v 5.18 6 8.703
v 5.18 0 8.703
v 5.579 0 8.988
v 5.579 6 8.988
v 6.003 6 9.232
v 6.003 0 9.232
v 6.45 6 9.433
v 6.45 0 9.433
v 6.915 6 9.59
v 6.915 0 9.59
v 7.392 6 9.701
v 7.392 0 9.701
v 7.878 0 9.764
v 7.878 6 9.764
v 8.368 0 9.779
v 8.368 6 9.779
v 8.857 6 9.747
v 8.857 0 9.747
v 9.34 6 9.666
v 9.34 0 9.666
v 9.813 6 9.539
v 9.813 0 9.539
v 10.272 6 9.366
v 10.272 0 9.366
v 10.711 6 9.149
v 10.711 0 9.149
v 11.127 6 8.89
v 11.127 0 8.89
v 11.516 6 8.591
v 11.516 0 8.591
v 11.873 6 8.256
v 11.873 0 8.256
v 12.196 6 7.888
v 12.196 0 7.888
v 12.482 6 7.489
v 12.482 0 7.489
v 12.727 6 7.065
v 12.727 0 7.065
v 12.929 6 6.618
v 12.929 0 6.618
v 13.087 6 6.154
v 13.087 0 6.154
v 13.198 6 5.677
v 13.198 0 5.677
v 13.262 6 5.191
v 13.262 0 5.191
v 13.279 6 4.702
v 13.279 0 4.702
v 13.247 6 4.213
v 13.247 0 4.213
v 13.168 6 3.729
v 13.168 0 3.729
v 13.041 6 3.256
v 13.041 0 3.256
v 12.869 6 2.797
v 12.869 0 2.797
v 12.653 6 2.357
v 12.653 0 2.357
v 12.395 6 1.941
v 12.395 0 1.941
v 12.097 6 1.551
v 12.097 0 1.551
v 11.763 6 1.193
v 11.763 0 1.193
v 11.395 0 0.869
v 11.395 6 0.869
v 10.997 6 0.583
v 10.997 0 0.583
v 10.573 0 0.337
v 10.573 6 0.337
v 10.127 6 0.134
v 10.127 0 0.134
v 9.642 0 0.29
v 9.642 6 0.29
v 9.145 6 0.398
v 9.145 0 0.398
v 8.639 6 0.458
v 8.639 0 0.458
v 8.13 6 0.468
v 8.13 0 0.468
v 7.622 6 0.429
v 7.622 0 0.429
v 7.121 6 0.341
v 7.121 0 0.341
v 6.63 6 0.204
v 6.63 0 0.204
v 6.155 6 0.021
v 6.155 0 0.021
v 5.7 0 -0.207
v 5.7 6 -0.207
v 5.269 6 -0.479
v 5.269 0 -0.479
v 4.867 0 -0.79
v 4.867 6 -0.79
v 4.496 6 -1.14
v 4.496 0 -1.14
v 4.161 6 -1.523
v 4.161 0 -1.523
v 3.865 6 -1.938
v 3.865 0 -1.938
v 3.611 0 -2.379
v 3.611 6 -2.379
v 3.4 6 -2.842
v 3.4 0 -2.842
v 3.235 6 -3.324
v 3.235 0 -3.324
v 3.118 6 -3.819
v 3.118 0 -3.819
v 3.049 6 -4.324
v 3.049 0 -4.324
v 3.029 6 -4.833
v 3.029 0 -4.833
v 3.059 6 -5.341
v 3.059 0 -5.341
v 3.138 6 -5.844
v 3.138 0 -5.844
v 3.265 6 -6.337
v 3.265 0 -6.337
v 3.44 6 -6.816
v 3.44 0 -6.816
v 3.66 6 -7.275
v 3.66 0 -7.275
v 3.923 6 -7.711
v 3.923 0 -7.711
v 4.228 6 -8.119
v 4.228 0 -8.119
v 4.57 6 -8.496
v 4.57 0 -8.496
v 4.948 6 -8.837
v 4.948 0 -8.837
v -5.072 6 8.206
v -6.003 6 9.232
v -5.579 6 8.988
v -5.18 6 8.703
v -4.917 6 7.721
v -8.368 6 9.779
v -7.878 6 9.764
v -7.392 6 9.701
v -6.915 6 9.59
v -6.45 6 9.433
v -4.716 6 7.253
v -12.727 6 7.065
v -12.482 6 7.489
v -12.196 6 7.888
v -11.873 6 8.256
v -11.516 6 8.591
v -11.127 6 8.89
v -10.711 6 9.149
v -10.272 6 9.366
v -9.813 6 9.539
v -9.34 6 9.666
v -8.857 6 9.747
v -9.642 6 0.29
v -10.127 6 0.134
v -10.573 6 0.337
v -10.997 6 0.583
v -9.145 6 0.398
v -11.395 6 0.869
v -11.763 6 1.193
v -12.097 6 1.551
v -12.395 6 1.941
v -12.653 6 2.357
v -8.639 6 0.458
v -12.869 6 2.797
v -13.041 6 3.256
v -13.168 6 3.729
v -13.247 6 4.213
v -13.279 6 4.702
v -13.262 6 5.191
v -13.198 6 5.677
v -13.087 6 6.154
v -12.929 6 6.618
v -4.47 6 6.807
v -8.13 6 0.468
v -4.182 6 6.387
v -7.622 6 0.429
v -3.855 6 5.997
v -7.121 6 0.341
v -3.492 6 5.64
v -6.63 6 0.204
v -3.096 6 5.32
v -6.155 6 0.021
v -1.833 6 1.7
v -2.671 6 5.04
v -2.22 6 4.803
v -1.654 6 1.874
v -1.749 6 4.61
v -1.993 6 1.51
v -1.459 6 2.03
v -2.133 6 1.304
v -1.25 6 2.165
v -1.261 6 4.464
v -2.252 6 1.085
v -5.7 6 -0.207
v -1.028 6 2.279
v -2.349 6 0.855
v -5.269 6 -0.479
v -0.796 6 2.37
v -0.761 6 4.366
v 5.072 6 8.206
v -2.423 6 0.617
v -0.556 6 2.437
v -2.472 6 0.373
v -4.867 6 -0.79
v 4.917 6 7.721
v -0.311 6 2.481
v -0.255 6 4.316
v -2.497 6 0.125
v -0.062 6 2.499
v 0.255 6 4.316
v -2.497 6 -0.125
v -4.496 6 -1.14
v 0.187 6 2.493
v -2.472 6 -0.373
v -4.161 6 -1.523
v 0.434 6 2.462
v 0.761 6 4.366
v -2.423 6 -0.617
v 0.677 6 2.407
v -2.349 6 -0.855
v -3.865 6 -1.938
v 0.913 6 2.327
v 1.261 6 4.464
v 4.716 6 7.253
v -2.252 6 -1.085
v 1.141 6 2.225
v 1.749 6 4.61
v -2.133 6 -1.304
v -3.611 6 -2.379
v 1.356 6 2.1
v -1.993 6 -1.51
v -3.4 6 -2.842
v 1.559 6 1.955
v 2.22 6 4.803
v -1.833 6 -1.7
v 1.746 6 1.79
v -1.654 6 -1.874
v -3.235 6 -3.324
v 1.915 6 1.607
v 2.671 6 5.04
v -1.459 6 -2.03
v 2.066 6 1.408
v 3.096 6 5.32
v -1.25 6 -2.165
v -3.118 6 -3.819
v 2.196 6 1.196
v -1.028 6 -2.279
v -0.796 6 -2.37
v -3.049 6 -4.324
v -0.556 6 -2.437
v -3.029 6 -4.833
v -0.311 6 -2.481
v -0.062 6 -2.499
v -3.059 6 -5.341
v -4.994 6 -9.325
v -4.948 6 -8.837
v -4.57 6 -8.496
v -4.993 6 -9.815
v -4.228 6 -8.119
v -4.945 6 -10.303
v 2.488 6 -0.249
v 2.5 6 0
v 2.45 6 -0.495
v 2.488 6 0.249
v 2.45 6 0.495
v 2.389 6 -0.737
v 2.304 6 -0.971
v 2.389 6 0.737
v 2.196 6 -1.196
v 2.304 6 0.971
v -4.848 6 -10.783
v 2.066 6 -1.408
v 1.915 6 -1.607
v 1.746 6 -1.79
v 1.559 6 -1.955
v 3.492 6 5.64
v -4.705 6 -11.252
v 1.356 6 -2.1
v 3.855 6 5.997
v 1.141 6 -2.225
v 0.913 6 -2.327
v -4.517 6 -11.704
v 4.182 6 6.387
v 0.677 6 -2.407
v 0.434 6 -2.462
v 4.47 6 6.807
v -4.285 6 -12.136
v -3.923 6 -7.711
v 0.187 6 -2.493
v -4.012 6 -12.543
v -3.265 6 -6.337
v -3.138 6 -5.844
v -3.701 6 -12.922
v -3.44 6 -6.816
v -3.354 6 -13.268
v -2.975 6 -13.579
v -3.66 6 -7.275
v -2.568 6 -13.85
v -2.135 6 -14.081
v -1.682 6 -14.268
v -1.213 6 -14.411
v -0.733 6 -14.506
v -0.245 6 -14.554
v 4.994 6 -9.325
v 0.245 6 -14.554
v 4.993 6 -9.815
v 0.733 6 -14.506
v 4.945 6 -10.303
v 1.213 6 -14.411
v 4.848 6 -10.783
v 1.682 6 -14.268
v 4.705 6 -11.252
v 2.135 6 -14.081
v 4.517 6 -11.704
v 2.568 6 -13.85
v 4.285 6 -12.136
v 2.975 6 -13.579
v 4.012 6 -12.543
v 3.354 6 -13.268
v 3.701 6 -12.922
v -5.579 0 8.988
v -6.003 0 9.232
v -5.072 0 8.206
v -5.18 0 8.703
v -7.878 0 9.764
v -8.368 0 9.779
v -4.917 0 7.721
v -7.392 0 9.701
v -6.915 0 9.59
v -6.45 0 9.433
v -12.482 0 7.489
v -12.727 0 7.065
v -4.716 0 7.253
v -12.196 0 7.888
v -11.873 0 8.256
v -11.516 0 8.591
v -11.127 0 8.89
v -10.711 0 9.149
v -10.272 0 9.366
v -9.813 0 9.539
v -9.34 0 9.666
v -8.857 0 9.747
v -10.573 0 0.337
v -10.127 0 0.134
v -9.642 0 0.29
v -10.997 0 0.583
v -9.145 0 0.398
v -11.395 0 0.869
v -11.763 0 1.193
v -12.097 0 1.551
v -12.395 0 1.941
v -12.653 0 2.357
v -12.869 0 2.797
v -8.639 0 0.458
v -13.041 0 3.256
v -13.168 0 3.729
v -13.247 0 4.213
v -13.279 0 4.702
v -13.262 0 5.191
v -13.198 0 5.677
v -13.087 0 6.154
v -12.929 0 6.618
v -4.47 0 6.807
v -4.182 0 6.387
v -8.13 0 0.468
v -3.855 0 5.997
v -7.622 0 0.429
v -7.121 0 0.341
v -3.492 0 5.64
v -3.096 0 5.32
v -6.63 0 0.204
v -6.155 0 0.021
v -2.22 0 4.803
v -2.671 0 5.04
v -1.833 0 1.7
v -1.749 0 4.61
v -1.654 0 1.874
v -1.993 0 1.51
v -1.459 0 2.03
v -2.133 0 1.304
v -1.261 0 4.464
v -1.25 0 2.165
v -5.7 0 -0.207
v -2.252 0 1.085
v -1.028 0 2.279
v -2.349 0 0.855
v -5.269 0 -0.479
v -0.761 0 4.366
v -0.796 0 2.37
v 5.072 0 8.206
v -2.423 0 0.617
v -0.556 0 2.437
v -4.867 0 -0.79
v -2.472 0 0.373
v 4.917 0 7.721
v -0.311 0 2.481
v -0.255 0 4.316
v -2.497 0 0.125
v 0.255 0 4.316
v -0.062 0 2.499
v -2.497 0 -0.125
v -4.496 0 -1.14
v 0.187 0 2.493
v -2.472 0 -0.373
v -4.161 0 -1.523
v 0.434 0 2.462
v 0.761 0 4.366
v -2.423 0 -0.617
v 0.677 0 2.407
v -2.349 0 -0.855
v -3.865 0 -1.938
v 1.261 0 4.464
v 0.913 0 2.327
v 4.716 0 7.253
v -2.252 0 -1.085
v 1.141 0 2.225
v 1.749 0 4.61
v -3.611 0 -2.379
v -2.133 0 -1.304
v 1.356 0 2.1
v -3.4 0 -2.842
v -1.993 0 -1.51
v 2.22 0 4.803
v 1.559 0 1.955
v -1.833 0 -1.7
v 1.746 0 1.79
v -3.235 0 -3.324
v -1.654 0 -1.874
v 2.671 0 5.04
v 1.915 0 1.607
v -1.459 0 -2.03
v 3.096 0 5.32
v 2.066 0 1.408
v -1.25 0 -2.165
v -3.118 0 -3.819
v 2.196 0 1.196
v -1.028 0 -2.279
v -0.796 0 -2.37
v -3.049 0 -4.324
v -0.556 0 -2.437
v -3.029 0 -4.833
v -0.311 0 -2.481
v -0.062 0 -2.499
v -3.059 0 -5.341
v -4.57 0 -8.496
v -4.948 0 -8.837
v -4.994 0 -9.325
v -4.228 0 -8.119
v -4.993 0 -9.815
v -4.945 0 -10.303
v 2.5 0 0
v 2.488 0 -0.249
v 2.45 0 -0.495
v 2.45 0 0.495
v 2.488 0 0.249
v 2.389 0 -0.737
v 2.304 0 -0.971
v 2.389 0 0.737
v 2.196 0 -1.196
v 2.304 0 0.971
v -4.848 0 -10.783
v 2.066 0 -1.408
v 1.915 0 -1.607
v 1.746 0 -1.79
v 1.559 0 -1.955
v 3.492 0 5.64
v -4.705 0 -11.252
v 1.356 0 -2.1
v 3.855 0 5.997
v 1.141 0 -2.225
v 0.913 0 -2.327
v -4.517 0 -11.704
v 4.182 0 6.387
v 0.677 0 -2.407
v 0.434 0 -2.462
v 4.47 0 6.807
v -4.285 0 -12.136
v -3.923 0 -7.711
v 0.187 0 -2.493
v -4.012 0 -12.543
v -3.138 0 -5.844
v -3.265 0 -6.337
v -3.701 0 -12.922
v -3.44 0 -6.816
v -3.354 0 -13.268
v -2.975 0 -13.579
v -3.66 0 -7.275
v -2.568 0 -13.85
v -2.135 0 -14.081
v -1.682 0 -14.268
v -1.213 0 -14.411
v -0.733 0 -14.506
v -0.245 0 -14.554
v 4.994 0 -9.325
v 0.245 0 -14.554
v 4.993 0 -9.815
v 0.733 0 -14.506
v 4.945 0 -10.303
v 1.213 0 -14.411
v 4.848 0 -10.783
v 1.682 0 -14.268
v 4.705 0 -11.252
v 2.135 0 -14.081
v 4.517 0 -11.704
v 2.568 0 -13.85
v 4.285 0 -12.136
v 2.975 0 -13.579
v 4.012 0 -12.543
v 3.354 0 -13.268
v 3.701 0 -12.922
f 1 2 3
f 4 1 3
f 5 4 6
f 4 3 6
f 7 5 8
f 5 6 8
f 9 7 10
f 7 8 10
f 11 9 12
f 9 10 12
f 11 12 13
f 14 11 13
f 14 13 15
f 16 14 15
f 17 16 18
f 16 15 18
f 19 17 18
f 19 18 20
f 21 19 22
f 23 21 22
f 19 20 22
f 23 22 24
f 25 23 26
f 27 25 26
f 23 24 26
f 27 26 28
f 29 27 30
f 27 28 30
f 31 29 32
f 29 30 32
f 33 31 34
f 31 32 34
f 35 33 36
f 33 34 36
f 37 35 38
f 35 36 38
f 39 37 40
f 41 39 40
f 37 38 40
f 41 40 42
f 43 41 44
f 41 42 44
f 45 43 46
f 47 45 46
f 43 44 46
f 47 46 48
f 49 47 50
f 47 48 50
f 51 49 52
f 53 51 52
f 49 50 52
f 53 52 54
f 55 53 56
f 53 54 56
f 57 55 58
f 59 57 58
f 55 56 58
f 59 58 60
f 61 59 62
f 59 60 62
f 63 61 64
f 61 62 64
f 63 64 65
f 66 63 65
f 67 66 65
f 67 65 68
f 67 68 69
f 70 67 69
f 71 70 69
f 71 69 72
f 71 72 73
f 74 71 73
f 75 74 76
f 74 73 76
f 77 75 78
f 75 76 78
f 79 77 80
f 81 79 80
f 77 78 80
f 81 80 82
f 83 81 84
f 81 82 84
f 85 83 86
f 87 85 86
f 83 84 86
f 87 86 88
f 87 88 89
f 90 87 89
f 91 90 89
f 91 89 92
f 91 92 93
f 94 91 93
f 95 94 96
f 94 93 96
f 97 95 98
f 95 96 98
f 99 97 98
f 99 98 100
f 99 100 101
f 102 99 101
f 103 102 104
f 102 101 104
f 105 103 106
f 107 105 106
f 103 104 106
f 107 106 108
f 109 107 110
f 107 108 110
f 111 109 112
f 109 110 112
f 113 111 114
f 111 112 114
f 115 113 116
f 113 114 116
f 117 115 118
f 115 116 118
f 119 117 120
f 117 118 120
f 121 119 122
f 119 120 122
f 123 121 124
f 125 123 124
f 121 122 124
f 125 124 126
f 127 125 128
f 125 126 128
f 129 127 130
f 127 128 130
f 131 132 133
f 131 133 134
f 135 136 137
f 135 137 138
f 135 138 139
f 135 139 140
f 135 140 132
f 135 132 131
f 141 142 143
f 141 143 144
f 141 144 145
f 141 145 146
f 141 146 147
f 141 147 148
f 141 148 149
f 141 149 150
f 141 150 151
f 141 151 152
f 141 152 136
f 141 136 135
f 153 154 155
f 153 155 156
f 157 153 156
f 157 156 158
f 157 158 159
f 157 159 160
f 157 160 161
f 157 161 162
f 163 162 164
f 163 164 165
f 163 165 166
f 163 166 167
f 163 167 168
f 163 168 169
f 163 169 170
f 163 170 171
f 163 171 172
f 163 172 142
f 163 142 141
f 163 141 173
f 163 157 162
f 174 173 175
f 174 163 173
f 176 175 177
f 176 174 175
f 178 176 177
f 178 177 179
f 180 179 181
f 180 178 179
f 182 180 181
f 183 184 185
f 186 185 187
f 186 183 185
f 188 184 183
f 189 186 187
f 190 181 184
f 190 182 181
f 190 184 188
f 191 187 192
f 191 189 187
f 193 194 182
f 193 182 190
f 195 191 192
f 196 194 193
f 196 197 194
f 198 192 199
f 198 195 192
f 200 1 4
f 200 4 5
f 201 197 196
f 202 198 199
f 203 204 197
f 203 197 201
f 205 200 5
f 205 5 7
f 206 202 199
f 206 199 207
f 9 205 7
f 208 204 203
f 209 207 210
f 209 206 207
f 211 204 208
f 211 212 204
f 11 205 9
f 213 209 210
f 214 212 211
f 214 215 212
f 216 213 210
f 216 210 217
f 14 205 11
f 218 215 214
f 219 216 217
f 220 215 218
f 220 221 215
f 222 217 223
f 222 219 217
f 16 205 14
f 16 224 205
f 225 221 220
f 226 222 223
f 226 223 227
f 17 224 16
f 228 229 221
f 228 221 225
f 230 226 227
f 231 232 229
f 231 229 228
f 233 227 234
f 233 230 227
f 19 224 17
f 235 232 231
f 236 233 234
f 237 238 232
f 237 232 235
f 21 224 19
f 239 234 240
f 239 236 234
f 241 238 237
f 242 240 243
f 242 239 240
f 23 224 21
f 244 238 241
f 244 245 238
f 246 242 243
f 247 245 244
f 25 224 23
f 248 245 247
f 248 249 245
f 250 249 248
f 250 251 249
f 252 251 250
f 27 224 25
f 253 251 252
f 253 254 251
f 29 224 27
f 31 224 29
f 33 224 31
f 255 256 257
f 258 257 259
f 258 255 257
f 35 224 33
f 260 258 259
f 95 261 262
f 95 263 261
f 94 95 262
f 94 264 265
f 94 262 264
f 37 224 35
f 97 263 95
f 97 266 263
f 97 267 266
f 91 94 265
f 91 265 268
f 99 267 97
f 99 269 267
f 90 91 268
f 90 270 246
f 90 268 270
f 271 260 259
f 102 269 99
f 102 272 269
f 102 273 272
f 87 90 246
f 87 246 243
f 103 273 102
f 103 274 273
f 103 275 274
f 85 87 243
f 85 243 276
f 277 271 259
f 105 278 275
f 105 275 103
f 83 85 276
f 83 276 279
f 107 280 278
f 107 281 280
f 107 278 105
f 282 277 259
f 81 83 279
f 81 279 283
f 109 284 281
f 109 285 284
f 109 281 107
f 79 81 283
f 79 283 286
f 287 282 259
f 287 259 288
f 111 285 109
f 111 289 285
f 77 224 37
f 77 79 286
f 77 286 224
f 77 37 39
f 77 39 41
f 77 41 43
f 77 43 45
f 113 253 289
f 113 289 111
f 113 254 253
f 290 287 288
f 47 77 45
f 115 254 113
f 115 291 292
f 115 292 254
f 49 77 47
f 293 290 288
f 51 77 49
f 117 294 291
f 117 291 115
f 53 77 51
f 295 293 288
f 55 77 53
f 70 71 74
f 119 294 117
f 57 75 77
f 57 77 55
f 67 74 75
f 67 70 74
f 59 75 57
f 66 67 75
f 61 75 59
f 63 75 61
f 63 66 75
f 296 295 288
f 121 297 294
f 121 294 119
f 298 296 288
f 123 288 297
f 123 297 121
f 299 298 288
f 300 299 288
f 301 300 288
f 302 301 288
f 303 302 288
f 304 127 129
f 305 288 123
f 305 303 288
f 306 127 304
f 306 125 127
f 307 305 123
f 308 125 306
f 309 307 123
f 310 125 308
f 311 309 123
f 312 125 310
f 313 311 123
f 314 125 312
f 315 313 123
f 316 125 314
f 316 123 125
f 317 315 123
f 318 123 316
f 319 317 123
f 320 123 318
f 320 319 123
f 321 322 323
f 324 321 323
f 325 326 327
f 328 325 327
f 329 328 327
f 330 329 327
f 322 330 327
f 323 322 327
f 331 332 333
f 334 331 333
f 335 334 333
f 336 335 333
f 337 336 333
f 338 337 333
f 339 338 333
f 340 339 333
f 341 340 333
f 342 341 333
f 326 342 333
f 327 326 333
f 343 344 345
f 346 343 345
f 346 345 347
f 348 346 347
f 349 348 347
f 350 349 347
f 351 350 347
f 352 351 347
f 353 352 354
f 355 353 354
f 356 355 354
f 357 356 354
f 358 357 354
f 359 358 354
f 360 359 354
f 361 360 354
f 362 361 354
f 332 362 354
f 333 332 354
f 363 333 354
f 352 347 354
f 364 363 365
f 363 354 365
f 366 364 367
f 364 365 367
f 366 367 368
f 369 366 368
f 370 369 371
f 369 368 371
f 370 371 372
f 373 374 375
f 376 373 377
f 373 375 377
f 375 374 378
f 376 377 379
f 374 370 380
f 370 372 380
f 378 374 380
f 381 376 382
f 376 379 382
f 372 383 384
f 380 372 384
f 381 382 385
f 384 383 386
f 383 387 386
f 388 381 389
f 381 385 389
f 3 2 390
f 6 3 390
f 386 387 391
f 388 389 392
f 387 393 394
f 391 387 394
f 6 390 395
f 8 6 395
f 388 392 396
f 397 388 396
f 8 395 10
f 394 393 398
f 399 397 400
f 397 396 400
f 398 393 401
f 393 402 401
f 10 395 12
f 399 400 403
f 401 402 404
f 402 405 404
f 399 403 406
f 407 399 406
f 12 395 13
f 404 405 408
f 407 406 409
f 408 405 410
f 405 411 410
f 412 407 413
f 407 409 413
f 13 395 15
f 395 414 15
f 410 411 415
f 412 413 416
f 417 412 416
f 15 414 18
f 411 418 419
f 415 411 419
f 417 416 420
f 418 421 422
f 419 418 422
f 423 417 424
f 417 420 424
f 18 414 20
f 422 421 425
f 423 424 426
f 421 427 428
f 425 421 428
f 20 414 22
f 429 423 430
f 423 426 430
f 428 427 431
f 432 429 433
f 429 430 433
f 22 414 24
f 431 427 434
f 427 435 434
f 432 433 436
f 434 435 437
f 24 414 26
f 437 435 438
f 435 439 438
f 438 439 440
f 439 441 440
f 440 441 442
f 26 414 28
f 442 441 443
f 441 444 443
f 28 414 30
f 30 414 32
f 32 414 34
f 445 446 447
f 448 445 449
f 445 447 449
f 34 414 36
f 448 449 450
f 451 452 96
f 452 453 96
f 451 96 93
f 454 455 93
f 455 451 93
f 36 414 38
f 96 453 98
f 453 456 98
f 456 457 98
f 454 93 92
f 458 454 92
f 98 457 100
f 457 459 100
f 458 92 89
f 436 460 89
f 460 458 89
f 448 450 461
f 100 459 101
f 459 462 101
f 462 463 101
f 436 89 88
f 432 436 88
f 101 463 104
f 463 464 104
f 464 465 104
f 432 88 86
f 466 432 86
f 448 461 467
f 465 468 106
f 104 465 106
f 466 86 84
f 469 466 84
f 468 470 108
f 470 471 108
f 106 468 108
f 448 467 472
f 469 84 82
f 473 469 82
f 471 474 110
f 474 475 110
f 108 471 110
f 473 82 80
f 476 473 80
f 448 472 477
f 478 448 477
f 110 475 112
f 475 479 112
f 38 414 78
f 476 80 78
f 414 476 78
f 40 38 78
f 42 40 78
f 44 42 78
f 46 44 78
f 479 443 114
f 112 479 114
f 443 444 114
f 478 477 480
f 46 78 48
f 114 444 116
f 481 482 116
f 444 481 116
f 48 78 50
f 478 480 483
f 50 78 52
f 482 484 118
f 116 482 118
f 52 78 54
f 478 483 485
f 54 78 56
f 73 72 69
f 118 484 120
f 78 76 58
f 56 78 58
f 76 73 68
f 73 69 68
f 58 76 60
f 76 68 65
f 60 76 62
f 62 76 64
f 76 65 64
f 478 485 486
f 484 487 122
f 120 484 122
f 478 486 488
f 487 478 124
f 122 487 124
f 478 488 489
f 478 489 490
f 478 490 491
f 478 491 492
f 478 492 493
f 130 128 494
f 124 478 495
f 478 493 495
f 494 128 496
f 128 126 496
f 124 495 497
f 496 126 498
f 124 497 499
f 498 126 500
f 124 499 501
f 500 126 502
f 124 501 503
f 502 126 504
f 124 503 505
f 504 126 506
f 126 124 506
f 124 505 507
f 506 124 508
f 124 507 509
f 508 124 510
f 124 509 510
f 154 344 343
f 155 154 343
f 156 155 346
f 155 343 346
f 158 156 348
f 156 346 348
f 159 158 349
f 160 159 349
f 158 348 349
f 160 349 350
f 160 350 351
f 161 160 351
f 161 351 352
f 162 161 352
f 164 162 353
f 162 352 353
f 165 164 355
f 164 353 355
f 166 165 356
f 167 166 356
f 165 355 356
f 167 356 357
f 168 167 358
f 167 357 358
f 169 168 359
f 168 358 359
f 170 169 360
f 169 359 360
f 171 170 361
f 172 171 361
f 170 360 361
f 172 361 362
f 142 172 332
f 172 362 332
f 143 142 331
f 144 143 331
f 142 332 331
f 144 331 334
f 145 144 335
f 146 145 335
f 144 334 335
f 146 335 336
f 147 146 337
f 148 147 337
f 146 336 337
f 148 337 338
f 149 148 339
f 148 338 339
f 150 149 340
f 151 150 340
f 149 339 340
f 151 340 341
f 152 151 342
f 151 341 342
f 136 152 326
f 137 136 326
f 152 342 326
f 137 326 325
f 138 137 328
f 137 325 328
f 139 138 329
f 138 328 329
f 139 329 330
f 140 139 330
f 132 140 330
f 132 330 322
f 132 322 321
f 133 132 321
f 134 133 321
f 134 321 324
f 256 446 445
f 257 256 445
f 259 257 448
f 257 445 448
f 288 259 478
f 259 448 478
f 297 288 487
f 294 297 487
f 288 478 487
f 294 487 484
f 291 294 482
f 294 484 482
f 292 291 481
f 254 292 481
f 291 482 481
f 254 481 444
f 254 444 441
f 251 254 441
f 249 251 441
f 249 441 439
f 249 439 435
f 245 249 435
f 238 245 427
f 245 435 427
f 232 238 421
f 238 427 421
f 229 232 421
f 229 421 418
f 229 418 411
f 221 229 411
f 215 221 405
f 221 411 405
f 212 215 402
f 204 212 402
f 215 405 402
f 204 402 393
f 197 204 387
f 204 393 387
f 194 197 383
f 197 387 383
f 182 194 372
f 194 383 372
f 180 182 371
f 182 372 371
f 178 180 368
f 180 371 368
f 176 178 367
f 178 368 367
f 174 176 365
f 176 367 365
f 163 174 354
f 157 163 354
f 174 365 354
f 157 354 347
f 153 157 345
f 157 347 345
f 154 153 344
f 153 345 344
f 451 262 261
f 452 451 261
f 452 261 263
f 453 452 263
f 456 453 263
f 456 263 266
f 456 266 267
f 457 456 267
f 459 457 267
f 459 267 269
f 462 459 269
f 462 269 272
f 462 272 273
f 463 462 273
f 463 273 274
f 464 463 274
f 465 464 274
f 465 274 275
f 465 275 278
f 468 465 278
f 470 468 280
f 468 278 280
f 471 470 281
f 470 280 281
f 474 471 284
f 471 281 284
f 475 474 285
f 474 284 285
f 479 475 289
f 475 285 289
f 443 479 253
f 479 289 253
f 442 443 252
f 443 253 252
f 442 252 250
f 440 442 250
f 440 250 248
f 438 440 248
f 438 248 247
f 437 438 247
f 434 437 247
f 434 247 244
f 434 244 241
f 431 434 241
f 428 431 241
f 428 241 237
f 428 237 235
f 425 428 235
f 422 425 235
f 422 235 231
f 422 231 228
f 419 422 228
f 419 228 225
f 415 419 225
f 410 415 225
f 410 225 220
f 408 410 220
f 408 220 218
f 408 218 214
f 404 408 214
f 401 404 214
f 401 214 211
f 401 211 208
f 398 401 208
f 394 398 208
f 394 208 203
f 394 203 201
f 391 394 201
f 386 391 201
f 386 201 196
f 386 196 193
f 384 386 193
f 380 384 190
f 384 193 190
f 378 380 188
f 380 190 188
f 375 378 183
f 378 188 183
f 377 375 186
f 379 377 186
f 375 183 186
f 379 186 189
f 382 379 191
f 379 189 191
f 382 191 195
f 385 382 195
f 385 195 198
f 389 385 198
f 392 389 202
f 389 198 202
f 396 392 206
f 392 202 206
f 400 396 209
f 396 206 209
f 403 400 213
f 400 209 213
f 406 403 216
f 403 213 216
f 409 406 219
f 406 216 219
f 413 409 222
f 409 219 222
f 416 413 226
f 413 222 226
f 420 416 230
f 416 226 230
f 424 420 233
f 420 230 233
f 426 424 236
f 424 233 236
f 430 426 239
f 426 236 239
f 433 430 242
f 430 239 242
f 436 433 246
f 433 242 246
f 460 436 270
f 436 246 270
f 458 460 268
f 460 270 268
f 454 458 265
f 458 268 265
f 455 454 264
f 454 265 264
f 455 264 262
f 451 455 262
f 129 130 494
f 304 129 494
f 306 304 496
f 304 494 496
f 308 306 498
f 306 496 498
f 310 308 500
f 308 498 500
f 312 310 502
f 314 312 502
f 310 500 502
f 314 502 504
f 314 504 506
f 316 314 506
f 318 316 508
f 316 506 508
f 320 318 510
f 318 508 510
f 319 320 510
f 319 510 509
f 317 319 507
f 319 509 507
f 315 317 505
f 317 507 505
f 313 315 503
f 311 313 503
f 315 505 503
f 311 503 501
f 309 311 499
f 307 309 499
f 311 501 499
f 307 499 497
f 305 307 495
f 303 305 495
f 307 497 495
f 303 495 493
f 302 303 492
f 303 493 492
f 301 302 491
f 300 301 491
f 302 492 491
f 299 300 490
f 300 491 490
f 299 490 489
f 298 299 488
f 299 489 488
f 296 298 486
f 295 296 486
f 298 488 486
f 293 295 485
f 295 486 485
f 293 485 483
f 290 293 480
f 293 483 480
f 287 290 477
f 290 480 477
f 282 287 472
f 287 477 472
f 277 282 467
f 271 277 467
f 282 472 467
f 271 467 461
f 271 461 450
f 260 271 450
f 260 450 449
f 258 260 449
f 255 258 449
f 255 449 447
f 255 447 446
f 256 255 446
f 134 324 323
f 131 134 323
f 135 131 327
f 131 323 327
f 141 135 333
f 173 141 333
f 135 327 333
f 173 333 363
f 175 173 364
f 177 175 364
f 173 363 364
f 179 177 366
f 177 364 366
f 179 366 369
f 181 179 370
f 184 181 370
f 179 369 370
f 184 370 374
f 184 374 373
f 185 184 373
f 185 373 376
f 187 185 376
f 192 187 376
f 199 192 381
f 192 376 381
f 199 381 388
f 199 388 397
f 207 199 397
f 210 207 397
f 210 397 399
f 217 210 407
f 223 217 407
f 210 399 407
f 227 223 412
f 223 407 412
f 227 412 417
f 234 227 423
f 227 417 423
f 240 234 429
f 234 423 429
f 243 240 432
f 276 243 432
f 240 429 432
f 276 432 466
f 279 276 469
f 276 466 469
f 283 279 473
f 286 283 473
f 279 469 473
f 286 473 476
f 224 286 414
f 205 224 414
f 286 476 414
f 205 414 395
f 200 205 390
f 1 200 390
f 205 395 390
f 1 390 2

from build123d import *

# Parameters (mm, degrees)
BOSS_EXTRUDE1_DEPTH = 6
SKETCH3_R           = 2.5
CUT_EXTRUDE1_DEPTH  = 8


with BuildPart() as part:
    # Sketch2 → Boss-Extrude1 (new body)
    with BuildSketch(Plane(origin=(0, 0, 0), x_dir=(1, 0, 0), z_dir=(0, 1, 0))):
        with BuildLine():
            ThreePointArc((10.127144448, -0.134021967), (3.73256949, 2.155), (4.947505796, 8.837375343))
            ThreePointArc((4.947505796, 8.837375343), (0, 14.56), (-4.947505796, 8.837375343))
            ThreePointArc((-4.947505796, 8.837375343), (-3.73256949, 2.155), (-10.127144448, -0.134021967))
            ThreePointArc((-10.127144448, -0.134021967), (-12.609329879, -7.28), (-5.179638652, -8.703353377))
            ThreePointArc((-5.179638652, -8.703353377), (0, -4.31), (5.179638652, -8.703353377))
            ThreePointArc((5.179638652, -8.703353377), (12.609329879, -7.28), (10.127144448, -0.134021967))
        make_face()
    extrude(amount=BOSS_EXTRUDE1_DEPTH)

    # Sketch3 → Cut-Extrude1 (cut)
    with BuildSketch(Plane(origin=(0, 6, 0), x_dir=(1, 0, 0), z_dir=(0, 1, 0))):
        Circle(SKETCH3_R)
    extrude(amount=-CUT_EXTRUDE1_DEPTH, mode=Mode.SUBTRACT)


solid = part.part
